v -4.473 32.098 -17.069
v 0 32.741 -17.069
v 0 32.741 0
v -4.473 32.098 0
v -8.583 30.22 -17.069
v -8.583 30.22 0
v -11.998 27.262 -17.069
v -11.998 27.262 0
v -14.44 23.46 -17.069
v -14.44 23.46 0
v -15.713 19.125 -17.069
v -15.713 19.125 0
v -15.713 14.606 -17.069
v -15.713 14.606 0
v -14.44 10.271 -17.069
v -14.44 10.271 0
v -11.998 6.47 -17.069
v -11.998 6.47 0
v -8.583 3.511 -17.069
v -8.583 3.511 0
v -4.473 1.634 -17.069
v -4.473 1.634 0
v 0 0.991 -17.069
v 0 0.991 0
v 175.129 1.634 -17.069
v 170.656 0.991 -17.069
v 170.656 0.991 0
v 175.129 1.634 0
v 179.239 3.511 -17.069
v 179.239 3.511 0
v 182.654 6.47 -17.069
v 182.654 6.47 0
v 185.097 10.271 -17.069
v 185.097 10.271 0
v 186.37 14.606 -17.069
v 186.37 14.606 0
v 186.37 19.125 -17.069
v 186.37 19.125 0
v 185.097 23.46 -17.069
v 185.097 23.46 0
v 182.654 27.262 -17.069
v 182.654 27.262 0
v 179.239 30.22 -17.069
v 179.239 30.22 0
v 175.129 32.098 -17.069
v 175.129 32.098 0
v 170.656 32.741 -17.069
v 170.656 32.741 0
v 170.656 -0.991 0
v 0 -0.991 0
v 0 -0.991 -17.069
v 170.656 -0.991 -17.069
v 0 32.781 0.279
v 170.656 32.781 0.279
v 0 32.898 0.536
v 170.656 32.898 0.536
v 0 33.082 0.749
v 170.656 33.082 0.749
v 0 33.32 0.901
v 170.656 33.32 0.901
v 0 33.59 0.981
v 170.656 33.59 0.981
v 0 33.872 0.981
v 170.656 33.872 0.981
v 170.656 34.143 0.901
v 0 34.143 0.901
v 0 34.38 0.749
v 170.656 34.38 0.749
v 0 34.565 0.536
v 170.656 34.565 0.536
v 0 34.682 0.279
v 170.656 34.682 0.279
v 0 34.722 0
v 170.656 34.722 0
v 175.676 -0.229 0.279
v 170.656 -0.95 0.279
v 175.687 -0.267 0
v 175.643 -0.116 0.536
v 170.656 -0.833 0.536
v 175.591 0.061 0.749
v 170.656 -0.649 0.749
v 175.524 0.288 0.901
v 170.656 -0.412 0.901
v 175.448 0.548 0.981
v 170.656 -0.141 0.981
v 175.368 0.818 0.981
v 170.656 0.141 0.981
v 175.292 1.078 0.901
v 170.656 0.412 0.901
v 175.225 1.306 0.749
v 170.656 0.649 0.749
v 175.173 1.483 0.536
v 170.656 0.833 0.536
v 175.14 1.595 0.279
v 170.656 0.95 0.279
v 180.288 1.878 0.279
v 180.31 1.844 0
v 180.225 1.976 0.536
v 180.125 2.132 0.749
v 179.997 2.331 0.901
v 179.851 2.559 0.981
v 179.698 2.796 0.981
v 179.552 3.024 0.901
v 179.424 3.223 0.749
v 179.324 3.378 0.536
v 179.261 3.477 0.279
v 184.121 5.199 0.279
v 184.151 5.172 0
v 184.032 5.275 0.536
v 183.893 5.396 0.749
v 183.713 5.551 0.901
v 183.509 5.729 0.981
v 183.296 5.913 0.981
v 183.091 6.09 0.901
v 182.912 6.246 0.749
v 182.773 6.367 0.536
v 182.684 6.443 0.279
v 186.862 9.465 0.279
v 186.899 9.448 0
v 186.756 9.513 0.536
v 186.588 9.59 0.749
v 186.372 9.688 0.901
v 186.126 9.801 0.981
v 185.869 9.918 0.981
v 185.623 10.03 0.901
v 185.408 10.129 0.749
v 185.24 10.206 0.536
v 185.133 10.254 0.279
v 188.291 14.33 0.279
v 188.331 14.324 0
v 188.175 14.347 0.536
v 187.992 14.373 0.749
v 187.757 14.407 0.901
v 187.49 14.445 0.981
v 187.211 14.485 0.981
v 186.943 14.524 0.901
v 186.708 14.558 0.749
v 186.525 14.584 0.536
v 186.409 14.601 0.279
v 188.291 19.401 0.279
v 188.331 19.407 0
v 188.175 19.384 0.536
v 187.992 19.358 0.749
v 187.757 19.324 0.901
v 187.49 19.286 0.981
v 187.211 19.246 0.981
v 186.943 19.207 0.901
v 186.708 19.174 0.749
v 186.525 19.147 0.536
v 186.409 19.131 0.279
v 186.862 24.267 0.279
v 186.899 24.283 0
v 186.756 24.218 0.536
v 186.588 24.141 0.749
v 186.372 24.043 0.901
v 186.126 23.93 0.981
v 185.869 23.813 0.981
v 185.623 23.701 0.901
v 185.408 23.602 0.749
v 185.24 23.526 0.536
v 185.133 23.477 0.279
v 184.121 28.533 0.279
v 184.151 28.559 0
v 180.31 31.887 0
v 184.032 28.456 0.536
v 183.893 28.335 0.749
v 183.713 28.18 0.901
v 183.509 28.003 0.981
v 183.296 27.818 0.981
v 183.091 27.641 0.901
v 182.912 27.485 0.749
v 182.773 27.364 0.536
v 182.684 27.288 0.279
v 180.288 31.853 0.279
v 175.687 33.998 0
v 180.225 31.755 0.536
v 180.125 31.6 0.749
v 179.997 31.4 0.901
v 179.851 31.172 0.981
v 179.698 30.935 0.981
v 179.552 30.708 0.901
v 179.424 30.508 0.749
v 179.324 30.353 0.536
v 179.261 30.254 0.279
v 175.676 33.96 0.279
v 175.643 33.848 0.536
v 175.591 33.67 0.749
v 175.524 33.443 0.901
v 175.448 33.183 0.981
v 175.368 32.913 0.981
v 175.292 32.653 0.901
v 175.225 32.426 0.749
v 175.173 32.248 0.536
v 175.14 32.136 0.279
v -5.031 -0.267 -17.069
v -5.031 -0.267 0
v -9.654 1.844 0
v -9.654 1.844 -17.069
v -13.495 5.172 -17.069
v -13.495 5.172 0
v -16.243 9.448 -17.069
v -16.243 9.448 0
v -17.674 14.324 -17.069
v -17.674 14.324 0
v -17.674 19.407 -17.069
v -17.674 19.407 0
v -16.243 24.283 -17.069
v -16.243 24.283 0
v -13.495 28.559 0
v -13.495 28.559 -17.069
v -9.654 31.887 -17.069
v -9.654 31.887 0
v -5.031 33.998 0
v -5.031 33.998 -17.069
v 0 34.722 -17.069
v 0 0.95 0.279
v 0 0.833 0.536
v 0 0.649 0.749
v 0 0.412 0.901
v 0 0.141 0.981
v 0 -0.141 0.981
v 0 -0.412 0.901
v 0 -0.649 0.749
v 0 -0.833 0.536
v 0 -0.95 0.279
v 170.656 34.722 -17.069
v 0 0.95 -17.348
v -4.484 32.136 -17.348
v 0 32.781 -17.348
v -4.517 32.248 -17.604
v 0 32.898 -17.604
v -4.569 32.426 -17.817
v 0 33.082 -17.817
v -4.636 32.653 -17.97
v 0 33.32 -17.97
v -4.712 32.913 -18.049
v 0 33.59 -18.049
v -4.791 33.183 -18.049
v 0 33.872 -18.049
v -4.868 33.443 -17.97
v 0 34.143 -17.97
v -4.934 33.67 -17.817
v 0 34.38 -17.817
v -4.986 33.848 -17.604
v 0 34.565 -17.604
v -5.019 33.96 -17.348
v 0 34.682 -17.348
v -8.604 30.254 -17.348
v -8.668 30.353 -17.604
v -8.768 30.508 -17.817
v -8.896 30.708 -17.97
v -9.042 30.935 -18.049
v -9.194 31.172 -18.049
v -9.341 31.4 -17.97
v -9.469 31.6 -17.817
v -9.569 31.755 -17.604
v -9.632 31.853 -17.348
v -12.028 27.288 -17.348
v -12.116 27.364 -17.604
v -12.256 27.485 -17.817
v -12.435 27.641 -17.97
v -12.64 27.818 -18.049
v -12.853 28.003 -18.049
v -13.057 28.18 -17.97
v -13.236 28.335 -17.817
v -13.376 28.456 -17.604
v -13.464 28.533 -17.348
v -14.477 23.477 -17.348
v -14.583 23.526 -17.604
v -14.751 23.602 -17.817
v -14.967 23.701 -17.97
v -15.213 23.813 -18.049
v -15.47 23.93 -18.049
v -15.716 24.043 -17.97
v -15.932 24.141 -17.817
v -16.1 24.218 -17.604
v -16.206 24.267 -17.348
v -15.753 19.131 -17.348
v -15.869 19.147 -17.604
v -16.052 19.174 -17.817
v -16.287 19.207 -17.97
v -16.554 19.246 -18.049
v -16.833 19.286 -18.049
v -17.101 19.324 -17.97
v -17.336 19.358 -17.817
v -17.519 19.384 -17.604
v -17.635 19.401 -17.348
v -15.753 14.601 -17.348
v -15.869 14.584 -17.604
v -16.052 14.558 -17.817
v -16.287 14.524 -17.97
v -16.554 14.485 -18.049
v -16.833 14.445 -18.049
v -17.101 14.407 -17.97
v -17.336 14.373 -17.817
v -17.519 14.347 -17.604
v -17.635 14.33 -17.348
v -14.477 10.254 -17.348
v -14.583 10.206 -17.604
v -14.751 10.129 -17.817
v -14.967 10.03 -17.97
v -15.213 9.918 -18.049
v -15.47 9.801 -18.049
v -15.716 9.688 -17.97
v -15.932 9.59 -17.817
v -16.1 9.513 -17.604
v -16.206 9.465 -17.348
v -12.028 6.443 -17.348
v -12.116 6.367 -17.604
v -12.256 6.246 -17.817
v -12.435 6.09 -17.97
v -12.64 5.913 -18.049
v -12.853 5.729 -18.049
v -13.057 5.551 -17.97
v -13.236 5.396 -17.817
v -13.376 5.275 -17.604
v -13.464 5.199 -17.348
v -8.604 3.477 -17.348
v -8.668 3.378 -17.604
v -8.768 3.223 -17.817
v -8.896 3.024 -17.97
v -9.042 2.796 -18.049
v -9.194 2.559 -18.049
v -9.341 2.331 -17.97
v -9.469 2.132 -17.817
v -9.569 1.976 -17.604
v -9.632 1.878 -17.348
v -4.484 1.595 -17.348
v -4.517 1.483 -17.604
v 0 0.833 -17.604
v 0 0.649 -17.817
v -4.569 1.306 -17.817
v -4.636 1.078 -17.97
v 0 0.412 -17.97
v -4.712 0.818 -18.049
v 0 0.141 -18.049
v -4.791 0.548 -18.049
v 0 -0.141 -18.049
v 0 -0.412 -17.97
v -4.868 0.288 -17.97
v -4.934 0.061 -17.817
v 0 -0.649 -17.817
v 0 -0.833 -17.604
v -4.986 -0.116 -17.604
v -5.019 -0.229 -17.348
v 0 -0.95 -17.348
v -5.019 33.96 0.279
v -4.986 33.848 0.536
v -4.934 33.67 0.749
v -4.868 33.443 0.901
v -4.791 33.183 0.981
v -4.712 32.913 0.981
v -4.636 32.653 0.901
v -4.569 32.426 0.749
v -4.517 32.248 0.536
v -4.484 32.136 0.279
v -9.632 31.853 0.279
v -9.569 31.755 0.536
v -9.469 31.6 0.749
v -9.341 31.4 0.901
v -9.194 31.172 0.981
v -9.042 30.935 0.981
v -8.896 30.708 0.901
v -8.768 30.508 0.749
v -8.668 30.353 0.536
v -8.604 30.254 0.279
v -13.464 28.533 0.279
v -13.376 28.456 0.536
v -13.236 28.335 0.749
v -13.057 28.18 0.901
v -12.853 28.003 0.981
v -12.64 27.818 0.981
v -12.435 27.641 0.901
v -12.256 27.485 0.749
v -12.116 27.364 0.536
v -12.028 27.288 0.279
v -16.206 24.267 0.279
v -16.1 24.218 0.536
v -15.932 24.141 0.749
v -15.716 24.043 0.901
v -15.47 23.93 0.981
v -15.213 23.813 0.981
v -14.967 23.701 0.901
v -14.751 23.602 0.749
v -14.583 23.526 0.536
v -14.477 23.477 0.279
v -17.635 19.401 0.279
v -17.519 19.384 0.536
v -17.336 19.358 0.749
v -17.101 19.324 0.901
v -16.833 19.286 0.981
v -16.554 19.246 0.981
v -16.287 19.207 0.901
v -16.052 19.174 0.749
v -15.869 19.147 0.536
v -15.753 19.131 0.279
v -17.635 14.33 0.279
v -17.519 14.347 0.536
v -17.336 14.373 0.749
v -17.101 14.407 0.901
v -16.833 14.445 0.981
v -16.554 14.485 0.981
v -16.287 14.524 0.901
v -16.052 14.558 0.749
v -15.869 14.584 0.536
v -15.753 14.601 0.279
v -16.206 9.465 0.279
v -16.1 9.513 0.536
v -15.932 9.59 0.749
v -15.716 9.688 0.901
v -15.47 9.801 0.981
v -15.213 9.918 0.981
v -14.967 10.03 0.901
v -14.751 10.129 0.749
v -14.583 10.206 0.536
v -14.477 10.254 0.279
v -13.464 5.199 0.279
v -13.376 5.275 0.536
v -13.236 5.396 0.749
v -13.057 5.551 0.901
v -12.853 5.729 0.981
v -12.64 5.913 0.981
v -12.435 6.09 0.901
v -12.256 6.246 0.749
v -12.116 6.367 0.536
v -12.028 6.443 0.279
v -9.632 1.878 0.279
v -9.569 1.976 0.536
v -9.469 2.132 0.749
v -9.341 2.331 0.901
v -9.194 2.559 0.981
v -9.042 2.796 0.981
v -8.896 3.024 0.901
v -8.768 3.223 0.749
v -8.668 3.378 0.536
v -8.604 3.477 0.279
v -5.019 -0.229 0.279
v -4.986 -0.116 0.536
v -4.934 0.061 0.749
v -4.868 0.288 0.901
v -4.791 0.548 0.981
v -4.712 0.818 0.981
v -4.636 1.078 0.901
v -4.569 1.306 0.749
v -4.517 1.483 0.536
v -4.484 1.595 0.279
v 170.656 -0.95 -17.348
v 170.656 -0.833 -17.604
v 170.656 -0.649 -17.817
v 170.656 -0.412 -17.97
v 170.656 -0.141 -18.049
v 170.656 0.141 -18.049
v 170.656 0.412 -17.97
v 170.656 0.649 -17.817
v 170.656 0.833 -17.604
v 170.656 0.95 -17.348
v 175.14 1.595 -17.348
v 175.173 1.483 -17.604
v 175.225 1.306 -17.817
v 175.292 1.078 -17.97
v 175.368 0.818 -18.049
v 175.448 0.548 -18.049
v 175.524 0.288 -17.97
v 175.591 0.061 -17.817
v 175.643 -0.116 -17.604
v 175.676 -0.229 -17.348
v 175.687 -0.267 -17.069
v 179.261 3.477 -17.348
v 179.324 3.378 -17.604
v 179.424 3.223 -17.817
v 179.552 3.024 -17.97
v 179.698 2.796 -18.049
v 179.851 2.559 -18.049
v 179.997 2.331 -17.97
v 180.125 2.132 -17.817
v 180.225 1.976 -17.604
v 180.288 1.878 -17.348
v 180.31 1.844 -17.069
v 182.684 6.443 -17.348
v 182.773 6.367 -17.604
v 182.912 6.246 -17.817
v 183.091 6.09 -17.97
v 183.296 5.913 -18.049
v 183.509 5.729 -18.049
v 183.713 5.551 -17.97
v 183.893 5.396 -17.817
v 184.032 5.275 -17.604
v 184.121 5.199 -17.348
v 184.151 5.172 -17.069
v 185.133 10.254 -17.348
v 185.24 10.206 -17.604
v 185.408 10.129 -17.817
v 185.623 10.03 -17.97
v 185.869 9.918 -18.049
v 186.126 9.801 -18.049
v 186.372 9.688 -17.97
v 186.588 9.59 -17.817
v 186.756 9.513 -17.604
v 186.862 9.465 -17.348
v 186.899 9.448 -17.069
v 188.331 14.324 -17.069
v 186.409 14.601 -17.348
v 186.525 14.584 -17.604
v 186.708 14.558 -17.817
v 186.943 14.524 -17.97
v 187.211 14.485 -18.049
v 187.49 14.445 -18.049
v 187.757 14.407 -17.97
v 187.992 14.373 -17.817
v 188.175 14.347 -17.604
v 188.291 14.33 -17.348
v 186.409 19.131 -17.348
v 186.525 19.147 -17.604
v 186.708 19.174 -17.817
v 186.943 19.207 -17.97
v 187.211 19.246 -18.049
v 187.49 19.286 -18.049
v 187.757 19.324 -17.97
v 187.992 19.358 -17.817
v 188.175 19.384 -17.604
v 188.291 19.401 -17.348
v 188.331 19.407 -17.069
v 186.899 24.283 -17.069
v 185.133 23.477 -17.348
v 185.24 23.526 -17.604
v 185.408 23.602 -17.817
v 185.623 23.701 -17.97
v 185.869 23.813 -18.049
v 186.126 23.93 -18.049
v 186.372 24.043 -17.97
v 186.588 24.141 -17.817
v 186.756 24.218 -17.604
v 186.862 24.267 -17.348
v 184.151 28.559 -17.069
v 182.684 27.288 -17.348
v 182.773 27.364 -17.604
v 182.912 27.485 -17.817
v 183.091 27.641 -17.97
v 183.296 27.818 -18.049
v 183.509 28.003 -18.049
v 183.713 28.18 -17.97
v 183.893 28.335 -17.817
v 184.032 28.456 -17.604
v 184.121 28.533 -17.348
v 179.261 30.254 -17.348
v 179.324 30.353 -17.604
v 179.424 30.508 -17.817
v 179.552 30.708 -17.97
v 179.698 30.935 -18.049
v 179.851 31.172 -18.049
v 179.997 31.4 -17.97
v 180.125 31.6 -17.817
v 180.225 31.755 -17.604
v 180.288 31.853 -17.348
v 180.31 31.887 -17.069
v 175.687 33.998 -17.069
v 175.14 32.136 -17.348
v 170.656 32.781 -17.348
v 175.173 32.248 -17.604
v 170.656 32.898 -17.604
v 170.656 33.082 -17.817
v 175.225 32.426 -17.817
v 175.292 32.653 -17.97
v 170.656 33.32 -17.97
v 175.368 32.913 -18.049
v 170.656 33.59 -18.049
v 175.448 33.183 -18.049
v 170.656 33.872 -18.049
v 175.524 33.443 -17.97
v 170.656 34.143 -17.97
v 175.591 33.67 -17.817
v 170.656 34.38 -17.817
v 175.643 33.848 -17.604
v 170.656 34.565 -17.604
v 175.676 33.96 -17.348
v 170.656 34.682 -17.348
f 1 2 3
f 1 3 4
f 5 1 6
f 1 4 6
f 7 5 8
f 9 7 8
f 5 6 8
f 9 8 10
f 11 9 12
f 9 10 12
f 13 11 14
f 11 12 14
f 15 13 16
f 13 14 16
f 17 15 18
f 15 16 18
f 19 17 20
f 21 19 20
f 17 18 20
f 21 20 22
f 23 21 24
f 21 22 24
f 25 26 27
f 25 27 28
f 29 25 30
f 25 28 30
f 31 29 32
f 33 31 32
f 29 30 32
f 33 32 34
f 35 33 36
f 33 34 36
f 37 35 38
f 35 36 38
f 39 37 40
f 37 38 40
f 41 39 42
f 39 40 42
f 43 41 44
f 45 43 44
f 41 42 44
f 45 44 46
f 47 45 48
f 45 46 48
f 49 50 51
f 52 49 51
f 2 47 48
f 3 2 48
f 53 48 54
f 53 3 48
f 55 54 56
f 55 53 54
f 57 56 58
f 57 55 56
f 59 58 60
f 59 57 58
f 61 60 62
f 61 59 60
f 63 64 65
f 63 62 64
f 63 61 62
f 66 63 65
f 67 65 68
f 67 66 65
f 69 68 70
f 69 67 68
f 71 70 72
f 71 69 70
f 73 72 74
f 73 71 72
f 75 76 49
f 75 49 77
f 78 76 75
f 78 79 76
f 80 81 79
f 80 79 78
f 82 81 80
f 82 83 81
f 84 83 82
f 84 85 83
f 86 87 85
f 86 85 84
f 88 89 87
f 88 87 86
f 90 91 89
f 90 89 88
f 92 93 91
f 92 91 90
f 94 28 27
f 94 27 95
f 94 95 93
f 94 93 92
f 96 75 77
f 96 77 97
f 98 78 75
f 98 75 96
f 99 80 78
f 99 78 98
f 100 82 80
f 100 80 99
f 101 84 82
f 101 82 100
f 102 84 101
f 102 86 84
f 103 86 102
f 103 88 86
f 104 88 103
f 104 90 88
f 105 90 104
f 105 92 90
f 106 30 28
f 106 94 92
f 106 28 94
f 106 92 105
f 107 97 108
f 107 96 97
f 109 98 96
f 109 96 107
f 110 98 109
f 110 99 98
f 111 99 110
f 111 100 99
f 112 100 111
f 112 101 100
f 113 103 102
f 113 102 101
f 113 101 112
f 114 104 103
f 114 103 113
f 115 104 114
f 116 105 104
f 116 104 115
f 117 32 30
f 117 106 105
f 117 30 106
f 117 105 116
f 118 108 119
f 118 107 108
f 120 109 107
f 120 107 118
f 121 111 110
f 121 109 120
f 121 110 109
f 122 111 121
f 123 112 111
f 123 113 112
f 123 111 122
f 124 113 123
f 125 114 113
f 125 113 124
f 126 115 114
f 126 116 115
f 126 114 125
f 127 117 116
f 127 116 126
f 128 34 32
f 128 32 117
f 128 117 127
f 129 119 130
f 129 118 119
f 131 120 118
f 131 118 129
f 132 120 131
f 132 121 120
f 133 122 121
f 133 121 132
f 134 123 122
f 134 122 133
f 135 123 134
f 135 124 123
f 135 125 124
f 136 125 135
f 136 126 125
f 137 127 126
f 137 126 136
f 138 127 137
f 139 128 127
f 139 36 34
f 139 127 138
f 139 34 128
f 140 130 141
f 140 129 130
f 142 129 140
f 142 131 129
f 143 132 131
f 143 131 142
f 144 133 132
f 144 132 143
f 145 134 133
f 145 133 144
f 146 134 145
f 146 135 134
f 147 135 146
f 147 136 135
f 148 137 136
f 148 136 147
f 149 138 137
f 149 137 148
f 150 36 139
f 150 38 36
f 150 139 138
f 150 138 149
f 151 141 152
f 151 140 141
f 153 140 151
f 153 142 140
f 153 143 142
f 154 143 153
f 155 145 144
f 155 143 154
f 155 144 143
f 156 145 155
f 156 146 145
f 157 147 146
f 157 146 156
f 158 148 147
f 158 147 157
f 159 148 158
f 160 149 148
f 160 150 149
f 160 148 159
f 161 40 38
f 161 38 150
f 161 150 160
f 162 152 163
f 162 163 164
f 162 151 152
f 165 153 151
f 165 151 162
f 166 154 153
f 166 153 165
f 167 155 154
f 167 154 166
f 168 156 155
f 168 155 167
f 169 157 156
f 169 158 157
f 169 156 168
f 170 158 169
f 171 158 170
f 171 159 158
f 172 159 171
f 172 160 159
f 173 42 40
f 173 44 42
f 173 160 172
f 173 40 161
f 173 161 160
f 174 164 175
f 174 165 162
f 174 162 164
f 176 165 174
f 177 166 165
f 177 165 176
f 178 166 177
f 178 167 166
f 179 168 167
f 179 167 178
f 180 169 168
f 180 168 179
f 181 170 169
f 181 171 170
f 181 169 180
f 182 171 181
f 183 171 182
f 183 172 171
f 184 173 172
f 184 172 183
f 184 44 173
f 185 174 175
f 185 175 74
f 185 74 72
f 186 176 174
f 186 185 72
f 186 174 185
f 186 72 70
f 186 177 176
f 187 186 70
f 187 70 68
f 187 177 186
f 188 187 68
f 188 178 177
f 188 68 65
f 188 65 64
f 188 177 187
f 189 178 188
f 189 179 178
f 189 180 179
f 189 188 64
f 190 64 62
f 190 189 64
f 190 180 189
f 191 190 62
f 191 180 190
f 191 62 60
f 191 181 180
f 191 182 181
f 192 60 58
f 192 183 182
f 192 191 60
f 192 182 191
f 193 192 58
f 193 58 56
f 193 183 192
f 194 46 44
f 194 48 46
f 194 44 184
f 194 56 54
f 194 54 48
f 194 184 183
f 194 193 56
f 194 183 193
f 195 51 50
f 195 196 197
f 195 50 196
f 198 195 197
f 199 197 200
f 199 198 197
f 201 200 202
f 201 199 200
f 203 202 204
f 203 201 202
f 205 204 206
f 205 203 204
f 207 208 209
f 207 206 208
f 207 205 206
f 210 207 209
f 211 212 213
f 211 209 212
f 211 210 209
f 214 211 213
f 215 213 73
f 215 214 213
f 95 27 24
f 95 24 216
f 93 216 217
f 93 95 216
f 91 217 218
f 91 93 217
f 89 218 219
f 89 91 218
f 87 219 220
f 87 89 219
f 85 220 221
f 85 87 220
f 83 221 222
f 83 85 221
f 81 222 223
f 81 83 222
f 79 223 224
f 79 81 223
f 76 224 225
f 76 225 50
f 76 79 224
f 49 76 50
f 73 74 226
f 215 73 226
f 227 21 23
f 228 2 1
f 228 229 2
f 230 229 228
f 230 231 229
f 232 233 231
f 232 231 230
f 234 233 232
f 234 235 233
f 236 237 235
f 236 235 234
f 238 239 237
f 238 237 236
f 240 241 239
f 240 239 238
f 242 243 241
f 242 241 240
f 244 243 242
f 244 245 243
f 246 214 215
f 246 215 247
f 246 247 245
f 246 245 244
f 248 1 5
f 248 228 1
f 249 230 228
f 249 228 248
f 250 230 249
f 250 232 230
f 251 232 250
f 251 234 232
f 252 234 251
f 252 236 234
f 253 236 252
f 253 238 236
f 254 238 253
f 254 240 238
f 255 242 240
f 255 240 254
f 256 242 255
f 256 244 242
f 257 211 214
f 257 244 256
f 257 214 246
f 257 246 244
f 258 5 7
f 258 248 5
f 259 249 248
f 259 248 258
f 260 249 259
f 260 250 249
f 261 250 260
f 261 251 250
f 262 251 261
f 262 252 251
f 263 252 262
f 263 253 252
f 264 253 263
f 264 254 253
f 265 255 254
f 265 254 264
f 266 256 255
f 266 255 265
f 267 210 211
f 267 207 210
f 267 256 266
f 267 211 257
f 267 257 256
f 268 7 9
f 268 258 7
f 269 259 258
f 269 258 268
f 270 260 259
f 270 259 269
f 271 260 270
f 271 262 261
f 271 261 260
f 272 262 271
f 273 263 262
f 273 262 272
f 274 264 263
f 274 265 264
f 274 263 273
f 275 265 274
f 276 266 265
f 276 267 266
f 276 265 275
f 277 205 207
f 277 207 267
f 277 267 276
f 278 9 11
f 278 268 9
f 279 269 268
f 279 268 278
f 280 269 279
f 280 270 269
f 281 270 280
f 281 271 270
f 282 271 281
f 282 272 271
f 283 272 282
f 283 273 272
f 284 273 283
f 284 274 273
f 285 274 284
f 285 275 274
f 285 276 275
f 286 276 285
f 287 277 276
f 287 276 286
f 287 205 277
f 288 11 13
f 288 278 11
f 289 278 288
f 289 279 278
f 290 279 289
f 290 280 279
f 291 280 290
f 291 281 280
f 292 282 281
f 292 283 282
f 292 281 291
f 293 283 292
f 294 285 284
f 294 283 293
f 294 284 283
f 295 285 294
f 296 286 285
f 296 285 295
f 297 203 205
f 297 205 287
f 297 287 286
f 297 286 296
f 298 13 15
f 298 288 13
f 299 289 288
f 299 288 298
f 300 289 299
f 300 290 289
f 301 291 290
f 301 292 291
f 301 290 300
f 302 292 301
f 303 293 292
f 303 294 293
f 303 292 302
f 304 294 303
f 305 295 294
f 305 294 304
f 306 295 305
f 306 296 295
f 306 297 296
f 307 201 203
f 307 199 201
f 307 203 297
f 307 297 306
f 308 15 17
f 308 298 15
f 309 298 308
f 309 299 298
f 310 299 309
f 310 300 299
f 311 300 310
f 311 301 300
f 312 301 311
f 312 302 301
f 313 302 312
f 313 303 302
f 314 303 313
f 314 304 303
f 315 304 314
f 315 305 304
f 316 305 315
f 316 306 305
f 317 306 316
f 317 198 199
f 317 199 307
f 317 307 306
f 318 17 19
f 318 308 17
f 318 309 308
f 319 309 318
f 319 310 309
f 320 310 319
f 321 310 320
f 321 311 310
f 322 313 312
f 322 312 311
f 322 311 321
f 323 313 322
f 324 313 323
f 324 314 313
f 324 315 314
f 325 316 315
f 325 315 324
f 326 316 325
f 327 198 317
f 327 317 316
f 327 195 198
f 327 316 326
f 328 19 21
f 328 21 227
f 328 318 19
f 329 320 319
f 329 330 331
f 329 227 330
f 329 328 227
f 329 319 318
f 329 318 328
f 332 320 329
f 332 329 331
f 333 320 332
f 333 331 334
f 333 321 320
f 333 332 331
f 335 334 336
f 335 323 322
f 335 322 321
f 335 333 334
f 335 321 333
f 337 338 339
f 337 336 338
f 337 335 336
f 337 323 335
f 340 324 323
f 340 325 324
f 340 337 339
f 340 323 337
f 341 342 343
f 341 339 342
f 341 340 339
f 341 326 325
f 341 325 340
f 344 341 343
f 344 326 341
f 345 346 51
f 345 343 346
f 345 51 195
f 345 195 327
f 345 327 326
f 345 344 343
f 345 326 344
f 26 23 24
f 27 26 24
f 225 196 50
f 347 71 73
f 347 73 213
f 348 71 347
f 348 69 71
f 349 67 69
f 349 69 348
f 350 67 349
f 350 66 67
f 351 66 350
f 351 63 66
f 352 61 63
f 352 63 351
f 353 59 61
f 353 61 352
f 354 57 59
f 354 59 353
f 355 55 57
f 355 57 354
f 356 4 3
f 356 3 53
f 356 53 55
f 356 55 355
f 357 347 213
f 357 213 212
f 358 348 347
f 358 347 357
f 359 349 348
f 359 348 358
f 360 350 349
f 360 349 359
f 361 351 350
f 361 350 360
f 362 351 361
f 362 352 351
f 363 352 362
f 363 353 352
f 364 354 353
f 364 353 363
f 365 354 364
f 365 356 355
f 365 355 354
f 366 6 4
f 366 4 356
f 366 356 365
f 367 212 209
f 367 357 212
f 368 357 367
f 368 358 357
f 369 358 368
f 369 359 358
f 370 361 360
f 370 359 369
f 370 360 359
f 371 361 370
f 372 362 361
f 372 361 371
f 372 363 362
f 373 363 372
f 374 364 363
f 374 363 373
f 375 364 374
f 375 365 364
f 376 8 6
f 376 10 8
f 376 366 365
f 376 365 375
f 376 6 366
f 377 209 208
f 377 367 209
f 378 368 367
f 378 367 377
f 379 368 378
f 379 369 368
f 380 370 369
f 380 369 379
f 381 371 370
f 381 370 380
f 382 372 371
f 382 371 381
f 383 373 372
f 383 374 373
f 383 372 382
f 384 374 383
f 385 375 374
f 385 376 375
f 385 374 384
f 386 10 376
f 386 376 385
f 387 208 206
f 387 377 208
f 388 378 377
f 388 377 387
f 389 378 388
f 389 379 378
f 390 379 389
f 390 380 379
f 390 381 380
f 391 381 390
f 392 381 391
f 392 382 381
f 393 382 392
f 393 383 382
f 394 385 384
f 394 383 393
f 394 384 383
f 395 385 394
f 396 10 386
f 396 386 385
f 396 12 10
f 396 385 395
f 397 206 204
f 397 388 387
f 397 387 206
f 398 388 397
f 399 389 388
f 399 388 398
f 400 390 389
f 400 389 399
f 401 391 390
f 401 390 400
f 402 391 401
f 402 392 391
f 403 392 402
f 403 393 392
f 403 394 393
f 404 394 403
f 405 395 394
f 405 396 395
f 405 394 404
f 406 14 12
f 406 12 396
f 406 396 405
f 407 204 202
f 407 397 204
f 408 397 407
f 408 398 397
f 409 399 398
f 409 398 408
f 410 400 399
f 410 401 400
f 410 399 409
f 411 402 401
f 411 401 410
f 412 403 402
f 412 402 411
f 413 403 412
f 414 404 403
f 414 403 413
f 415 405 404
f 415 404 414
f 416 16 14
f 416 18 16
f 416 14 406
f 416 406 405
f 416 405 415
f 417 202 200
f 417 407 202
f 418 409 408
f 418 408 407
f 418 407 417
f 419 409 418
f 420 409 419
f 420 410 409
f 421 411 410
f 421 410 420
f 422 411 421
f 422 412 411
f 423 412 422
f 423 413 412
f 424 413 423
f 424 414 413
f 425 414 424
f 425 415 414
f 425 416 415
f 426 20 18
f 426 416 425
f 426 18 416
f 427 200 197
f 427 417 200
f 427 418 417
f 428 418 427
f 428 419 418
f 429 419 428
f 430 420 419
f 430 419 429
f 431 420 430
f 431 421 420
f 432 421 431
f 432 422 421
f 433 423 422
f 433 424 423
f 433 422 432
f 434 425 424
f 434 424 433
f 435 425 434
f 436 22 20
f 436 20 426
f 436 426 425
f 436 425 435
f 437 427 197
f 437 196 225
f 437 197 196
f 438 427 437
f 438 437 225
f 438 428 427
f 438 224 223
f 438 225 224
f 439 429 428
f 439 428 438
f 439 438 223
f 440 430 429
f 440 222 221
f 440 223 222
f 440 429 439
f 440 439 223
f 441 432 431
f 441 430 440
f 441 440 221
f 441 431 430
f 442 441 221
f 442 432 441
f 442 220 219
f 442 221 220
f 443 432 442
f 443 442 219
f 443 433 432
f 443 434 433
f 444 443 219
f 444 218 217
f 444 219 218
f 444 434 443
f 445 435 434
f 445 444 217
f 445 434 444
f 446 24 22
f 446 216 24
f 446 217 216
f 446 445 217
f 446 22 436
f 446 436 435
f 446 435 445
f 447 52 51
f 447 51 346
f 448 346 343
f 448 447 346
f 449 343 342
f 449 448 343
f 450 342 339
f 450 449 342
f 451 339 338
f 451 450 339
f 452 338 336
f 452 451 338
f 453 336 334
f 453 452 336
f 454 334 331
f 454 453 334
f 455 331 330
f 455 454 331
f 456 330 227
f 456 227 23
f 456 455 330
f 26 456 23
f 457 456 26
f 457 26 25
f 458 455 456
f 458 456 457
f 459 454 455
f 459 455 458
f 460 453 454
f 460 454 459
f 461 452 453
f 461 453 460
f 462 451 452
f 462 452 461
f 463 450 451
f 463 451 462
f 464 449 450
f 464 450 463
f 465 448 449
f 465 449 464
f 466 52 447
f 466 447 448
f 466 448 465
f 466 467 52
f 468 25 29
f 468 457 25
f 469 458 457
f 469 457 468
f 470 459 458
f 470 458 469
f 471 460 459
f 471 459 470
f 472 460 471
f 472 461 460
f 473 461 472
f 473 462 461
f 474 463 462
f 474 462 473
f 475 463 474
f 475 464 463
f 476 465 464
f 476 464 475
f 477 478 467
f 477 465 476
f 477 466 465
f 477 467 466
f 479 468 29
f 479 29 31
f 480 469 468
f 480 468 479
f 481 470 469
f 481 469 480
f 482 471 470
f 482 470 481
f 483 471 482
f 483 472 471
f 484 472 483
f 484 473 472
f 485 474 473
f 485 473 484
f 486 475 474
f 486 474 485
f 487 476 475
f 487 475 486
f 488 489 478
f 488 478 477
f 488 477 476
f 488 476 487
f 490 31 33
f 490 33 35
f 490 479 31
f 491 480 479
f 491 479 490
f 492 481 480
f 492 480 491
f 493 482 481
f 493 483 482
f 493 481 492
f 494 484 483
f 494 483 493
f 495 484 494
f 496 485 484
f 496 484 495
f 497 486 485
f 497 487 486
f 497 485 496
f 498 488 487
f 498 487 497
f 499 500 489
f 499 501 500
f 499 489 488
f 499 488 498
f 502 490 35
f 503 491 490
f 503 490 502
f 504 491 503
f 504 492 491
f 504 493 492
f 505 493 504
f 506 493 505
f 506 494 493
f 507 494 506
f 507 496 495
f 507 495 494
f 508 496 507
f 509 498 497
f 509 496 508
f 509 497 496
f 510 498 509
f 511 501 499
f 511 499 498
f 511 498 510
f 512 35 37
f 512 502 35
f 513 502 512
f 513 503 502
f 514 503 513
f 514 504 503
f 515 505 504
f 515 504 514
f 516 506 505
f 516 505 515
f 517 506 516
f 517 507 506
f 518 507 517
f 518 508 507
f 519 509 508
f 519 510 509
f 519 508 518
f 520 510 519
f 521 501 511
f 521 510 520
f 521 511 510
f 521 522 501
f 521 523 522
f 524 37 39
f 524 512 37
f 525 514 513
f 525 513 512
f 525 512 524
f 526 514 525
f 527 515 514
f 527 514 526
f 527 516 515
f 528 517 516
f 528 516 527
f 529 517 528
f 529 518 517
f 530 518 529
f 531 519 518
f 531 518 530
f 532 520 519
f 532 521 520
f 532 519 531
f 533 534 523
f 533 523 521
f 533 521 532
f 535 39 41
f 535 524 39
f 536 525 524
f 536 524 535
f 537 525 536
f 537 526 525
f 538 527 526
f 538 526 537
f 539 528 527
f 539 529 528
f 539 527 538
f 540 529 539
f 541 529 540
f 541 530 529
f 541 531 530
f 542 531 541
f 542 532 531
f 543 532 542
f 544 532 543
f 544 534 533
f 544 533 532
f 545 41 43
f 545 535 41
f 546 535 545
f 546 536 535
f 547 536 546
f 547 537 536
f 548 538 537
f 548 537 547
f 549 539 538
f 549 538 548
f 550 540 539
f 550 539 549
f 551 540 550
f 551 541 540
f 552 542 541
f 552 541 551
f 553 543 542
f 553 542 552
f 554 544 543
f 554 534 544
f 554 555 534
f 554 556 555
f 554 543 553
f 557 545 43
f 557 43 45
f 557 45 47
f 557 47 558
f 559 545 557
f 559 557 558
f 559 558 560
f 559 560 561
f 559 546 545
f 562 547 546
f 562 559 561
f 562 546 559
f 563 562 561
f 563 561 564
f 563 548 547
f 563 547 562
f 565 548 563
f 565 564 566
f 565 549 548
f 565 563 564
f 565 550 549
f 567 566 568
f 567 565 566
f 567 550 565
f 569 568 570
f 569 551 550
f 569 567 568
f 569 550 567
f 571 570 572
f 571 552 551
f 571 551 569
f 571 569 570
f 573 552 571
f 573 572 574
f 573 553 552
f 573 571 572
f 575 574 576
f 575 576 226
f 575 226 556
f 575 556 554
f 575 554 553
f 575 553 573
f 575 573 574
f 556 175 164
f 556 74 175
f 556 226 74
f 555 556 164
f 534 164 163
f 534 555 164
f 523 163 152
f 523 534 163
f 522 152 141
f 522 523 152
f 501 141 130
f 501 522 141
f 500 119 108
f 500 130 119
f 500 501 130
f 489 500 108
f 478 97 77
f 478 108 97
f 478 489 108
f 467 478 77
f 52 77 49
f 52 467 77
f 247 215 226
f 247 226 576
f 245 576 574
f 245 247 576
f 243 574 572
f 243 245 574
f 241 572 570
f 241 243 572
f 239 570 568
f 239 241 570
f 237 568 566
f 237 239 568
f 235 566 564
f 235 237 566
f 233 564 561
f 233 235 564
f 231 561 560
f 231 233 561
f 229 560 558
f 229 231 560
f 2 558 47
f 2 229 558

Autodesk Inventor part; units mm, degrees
ref_plane "YZ Plane" through (0, 0, 0) normal (1, 0, 0) x (0, 1, 0)
ref_plane "XZ Plane" through (0, 0, 0) normal (0, 1, 0) x (-1, 0, 0)
ref_plane "XY Plane" through (0, 0, 0) normal (0, 0, 1) x (1, 0, 0)
sketch "Sketch1" plane through (0, 0, 0) normal (0, 0, 1) x (1, 0, 0)
  line L0 (0, 0) -> (170.6562, 0)
  line L1 (170.6562, 33.7312) -> (0, 33.7312)
  arc A0 (0, 33.7312) -> (0, 0) centre (0, 16.8656) ccw
  arc A1 (170.6562, 0) -> (170.6562, 33.7312) centre (170.6562, 16.8656) ccw
  dimension "d2" = 16.8656
  dimension "d3" = 170.6562
sketch "Sketch2" plane through (0, 0, 0) normal (1, 0, 0) x (0, 1, 0)
  arc A0 (0.9906, 0) -> (-0.9906, 0) centre (0, 0) ccw
  line L0 (-0.9906, 0) -> (0.9906, 0) construction
  line L1 (-0.9906, 0) -> (-0.9906, -17.0688)
  line L2 (0.9906, 0) -> (0.9906, -17.0688)
  arc A1 (-0.9906, -17.0688) -> (0.9906, -17.0688) centre (0, -17.0688) ccw
  dimension "d8" = 1.9812
  dimension "d9" = 19.05
sweep "Sweep1" add profiles "Sketch2" path "Sketch1"
properties part number "Polycord" material "Rubber, Silicone"
